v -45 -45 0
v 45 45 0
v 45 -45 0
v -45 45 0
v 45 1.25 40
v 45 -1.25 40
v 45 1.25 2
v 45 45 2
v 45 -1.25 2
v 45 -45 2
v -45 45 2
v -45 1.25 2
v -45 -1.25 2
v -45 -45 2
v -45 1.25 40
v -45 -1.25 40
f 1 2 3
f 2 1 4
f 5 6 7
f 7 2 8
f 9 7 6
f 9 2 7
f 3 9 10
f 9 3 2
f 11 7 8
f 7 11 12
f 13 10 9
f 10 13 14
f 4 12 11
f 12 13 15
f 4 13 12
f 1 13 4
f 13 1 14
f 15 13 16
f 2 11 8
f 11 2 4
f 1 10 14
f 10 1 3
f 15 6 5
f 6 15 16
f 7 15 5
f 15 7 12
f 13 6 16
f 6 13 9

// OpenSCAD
// Built by bench/smallmodels/features/compiler.py from a list of features.
$fn = 64;
difference() {
  union() {
    translate([0, 0, 0]) translate([-45, -45, 0]) cube([90, 90, 2]);
  }
  union() {
    translate([-20.25, -20.25, -2]) rotate([0, 0, 0]) translate([-35.75, -35.75, 0]) cube([71.5, 71.5, 2]);
    translate([-6.75, -20.25, -2]) rotate([0, 0, 0]) translate([-35.75, -35.75, 0]) cube([71.5, 71.5, 2]);
    translate([6.75, -20.25, -2]) rotate([0, 0, 0]) translate([-35.75, -35.75, 0]) cube([71.5, 71.5, 2]);
    translate([20.25, -20.25, -2]) rotate([0, 0, 0]) translate([-35.75, -35.75, 0]) cube([71.5, 71.5, 2]);
    translate([-20.25, -6.75, -2]) rotate([0, 0, 0]) translate([-35.75, -35.75, 0]) cube([71.5, 71.5, 2]);
    translate([-6.75, -6.75, -2]) rotate([0, 0, 0]) translate([-35.75, -35.75, 0]) cube([71.5, 71.5, 2]);
    translate([6.75, -6.75, -2]) rotate([0, 0, 0]) translate([-35.75, -35.75, 0]) cube([71.5, 71.5, 2]);
    translate([20.25, -6.75, -2]) rotate([0, 0, 0]) translate([-35.75, -35.75, 0]) cube([71.5, 71.5, 2]);
    translate([-20.25, 6.75, -2]) rotate([0, 0, 0]) translate([-35.75, -35.75, 0]) cube([71.5, 71.5, 2]);
    translate([-6.75, 6.75, -2]) rotate([0, 0, 0]) translate([-35.75, -35.75, 0]) cube([71.5, 71.5, 2]);
    translate([6.75, 6.75, -2]) rotate([0, 0, 0]) translate([-35.75, -35.75, 0]) cube([71.5, 71.5, 2]);
    translate([20.25, 6.75, -2]) rotate([0, 0, 0]) translate([-35.75, -35.75, 0]) cube([71.5, 71.5, 2]);
    translate([-20.25, 20.25, -2]) rotate([0, 0, 0]) translate([-35.75, -35.75, 0]) cube([71.5, 71.5, 2]);
    translate([-6.75, 20.25, -2]) rotate([0, 0, 0]) translate([-35.75, -35.75, 0]) cube([71.5, 71.5, 2]);
    translate([6.75, 20.25, -2]) rotate([0, 0, 0]) translate([-35.75, -35.75, 0]) cube([71.5, 71.5, 2]);
    translate([20.25, 20.25, -2]) rotate([0, 0, 0]) translate([-35.75, -35.75, 0]) cube([71.5, 71.5, 2]);
  }
}
union() {
    translate([0, 0, 2]) translate([-45, -1.25, 0]) cube([90, 2.5, 38]);
  }
